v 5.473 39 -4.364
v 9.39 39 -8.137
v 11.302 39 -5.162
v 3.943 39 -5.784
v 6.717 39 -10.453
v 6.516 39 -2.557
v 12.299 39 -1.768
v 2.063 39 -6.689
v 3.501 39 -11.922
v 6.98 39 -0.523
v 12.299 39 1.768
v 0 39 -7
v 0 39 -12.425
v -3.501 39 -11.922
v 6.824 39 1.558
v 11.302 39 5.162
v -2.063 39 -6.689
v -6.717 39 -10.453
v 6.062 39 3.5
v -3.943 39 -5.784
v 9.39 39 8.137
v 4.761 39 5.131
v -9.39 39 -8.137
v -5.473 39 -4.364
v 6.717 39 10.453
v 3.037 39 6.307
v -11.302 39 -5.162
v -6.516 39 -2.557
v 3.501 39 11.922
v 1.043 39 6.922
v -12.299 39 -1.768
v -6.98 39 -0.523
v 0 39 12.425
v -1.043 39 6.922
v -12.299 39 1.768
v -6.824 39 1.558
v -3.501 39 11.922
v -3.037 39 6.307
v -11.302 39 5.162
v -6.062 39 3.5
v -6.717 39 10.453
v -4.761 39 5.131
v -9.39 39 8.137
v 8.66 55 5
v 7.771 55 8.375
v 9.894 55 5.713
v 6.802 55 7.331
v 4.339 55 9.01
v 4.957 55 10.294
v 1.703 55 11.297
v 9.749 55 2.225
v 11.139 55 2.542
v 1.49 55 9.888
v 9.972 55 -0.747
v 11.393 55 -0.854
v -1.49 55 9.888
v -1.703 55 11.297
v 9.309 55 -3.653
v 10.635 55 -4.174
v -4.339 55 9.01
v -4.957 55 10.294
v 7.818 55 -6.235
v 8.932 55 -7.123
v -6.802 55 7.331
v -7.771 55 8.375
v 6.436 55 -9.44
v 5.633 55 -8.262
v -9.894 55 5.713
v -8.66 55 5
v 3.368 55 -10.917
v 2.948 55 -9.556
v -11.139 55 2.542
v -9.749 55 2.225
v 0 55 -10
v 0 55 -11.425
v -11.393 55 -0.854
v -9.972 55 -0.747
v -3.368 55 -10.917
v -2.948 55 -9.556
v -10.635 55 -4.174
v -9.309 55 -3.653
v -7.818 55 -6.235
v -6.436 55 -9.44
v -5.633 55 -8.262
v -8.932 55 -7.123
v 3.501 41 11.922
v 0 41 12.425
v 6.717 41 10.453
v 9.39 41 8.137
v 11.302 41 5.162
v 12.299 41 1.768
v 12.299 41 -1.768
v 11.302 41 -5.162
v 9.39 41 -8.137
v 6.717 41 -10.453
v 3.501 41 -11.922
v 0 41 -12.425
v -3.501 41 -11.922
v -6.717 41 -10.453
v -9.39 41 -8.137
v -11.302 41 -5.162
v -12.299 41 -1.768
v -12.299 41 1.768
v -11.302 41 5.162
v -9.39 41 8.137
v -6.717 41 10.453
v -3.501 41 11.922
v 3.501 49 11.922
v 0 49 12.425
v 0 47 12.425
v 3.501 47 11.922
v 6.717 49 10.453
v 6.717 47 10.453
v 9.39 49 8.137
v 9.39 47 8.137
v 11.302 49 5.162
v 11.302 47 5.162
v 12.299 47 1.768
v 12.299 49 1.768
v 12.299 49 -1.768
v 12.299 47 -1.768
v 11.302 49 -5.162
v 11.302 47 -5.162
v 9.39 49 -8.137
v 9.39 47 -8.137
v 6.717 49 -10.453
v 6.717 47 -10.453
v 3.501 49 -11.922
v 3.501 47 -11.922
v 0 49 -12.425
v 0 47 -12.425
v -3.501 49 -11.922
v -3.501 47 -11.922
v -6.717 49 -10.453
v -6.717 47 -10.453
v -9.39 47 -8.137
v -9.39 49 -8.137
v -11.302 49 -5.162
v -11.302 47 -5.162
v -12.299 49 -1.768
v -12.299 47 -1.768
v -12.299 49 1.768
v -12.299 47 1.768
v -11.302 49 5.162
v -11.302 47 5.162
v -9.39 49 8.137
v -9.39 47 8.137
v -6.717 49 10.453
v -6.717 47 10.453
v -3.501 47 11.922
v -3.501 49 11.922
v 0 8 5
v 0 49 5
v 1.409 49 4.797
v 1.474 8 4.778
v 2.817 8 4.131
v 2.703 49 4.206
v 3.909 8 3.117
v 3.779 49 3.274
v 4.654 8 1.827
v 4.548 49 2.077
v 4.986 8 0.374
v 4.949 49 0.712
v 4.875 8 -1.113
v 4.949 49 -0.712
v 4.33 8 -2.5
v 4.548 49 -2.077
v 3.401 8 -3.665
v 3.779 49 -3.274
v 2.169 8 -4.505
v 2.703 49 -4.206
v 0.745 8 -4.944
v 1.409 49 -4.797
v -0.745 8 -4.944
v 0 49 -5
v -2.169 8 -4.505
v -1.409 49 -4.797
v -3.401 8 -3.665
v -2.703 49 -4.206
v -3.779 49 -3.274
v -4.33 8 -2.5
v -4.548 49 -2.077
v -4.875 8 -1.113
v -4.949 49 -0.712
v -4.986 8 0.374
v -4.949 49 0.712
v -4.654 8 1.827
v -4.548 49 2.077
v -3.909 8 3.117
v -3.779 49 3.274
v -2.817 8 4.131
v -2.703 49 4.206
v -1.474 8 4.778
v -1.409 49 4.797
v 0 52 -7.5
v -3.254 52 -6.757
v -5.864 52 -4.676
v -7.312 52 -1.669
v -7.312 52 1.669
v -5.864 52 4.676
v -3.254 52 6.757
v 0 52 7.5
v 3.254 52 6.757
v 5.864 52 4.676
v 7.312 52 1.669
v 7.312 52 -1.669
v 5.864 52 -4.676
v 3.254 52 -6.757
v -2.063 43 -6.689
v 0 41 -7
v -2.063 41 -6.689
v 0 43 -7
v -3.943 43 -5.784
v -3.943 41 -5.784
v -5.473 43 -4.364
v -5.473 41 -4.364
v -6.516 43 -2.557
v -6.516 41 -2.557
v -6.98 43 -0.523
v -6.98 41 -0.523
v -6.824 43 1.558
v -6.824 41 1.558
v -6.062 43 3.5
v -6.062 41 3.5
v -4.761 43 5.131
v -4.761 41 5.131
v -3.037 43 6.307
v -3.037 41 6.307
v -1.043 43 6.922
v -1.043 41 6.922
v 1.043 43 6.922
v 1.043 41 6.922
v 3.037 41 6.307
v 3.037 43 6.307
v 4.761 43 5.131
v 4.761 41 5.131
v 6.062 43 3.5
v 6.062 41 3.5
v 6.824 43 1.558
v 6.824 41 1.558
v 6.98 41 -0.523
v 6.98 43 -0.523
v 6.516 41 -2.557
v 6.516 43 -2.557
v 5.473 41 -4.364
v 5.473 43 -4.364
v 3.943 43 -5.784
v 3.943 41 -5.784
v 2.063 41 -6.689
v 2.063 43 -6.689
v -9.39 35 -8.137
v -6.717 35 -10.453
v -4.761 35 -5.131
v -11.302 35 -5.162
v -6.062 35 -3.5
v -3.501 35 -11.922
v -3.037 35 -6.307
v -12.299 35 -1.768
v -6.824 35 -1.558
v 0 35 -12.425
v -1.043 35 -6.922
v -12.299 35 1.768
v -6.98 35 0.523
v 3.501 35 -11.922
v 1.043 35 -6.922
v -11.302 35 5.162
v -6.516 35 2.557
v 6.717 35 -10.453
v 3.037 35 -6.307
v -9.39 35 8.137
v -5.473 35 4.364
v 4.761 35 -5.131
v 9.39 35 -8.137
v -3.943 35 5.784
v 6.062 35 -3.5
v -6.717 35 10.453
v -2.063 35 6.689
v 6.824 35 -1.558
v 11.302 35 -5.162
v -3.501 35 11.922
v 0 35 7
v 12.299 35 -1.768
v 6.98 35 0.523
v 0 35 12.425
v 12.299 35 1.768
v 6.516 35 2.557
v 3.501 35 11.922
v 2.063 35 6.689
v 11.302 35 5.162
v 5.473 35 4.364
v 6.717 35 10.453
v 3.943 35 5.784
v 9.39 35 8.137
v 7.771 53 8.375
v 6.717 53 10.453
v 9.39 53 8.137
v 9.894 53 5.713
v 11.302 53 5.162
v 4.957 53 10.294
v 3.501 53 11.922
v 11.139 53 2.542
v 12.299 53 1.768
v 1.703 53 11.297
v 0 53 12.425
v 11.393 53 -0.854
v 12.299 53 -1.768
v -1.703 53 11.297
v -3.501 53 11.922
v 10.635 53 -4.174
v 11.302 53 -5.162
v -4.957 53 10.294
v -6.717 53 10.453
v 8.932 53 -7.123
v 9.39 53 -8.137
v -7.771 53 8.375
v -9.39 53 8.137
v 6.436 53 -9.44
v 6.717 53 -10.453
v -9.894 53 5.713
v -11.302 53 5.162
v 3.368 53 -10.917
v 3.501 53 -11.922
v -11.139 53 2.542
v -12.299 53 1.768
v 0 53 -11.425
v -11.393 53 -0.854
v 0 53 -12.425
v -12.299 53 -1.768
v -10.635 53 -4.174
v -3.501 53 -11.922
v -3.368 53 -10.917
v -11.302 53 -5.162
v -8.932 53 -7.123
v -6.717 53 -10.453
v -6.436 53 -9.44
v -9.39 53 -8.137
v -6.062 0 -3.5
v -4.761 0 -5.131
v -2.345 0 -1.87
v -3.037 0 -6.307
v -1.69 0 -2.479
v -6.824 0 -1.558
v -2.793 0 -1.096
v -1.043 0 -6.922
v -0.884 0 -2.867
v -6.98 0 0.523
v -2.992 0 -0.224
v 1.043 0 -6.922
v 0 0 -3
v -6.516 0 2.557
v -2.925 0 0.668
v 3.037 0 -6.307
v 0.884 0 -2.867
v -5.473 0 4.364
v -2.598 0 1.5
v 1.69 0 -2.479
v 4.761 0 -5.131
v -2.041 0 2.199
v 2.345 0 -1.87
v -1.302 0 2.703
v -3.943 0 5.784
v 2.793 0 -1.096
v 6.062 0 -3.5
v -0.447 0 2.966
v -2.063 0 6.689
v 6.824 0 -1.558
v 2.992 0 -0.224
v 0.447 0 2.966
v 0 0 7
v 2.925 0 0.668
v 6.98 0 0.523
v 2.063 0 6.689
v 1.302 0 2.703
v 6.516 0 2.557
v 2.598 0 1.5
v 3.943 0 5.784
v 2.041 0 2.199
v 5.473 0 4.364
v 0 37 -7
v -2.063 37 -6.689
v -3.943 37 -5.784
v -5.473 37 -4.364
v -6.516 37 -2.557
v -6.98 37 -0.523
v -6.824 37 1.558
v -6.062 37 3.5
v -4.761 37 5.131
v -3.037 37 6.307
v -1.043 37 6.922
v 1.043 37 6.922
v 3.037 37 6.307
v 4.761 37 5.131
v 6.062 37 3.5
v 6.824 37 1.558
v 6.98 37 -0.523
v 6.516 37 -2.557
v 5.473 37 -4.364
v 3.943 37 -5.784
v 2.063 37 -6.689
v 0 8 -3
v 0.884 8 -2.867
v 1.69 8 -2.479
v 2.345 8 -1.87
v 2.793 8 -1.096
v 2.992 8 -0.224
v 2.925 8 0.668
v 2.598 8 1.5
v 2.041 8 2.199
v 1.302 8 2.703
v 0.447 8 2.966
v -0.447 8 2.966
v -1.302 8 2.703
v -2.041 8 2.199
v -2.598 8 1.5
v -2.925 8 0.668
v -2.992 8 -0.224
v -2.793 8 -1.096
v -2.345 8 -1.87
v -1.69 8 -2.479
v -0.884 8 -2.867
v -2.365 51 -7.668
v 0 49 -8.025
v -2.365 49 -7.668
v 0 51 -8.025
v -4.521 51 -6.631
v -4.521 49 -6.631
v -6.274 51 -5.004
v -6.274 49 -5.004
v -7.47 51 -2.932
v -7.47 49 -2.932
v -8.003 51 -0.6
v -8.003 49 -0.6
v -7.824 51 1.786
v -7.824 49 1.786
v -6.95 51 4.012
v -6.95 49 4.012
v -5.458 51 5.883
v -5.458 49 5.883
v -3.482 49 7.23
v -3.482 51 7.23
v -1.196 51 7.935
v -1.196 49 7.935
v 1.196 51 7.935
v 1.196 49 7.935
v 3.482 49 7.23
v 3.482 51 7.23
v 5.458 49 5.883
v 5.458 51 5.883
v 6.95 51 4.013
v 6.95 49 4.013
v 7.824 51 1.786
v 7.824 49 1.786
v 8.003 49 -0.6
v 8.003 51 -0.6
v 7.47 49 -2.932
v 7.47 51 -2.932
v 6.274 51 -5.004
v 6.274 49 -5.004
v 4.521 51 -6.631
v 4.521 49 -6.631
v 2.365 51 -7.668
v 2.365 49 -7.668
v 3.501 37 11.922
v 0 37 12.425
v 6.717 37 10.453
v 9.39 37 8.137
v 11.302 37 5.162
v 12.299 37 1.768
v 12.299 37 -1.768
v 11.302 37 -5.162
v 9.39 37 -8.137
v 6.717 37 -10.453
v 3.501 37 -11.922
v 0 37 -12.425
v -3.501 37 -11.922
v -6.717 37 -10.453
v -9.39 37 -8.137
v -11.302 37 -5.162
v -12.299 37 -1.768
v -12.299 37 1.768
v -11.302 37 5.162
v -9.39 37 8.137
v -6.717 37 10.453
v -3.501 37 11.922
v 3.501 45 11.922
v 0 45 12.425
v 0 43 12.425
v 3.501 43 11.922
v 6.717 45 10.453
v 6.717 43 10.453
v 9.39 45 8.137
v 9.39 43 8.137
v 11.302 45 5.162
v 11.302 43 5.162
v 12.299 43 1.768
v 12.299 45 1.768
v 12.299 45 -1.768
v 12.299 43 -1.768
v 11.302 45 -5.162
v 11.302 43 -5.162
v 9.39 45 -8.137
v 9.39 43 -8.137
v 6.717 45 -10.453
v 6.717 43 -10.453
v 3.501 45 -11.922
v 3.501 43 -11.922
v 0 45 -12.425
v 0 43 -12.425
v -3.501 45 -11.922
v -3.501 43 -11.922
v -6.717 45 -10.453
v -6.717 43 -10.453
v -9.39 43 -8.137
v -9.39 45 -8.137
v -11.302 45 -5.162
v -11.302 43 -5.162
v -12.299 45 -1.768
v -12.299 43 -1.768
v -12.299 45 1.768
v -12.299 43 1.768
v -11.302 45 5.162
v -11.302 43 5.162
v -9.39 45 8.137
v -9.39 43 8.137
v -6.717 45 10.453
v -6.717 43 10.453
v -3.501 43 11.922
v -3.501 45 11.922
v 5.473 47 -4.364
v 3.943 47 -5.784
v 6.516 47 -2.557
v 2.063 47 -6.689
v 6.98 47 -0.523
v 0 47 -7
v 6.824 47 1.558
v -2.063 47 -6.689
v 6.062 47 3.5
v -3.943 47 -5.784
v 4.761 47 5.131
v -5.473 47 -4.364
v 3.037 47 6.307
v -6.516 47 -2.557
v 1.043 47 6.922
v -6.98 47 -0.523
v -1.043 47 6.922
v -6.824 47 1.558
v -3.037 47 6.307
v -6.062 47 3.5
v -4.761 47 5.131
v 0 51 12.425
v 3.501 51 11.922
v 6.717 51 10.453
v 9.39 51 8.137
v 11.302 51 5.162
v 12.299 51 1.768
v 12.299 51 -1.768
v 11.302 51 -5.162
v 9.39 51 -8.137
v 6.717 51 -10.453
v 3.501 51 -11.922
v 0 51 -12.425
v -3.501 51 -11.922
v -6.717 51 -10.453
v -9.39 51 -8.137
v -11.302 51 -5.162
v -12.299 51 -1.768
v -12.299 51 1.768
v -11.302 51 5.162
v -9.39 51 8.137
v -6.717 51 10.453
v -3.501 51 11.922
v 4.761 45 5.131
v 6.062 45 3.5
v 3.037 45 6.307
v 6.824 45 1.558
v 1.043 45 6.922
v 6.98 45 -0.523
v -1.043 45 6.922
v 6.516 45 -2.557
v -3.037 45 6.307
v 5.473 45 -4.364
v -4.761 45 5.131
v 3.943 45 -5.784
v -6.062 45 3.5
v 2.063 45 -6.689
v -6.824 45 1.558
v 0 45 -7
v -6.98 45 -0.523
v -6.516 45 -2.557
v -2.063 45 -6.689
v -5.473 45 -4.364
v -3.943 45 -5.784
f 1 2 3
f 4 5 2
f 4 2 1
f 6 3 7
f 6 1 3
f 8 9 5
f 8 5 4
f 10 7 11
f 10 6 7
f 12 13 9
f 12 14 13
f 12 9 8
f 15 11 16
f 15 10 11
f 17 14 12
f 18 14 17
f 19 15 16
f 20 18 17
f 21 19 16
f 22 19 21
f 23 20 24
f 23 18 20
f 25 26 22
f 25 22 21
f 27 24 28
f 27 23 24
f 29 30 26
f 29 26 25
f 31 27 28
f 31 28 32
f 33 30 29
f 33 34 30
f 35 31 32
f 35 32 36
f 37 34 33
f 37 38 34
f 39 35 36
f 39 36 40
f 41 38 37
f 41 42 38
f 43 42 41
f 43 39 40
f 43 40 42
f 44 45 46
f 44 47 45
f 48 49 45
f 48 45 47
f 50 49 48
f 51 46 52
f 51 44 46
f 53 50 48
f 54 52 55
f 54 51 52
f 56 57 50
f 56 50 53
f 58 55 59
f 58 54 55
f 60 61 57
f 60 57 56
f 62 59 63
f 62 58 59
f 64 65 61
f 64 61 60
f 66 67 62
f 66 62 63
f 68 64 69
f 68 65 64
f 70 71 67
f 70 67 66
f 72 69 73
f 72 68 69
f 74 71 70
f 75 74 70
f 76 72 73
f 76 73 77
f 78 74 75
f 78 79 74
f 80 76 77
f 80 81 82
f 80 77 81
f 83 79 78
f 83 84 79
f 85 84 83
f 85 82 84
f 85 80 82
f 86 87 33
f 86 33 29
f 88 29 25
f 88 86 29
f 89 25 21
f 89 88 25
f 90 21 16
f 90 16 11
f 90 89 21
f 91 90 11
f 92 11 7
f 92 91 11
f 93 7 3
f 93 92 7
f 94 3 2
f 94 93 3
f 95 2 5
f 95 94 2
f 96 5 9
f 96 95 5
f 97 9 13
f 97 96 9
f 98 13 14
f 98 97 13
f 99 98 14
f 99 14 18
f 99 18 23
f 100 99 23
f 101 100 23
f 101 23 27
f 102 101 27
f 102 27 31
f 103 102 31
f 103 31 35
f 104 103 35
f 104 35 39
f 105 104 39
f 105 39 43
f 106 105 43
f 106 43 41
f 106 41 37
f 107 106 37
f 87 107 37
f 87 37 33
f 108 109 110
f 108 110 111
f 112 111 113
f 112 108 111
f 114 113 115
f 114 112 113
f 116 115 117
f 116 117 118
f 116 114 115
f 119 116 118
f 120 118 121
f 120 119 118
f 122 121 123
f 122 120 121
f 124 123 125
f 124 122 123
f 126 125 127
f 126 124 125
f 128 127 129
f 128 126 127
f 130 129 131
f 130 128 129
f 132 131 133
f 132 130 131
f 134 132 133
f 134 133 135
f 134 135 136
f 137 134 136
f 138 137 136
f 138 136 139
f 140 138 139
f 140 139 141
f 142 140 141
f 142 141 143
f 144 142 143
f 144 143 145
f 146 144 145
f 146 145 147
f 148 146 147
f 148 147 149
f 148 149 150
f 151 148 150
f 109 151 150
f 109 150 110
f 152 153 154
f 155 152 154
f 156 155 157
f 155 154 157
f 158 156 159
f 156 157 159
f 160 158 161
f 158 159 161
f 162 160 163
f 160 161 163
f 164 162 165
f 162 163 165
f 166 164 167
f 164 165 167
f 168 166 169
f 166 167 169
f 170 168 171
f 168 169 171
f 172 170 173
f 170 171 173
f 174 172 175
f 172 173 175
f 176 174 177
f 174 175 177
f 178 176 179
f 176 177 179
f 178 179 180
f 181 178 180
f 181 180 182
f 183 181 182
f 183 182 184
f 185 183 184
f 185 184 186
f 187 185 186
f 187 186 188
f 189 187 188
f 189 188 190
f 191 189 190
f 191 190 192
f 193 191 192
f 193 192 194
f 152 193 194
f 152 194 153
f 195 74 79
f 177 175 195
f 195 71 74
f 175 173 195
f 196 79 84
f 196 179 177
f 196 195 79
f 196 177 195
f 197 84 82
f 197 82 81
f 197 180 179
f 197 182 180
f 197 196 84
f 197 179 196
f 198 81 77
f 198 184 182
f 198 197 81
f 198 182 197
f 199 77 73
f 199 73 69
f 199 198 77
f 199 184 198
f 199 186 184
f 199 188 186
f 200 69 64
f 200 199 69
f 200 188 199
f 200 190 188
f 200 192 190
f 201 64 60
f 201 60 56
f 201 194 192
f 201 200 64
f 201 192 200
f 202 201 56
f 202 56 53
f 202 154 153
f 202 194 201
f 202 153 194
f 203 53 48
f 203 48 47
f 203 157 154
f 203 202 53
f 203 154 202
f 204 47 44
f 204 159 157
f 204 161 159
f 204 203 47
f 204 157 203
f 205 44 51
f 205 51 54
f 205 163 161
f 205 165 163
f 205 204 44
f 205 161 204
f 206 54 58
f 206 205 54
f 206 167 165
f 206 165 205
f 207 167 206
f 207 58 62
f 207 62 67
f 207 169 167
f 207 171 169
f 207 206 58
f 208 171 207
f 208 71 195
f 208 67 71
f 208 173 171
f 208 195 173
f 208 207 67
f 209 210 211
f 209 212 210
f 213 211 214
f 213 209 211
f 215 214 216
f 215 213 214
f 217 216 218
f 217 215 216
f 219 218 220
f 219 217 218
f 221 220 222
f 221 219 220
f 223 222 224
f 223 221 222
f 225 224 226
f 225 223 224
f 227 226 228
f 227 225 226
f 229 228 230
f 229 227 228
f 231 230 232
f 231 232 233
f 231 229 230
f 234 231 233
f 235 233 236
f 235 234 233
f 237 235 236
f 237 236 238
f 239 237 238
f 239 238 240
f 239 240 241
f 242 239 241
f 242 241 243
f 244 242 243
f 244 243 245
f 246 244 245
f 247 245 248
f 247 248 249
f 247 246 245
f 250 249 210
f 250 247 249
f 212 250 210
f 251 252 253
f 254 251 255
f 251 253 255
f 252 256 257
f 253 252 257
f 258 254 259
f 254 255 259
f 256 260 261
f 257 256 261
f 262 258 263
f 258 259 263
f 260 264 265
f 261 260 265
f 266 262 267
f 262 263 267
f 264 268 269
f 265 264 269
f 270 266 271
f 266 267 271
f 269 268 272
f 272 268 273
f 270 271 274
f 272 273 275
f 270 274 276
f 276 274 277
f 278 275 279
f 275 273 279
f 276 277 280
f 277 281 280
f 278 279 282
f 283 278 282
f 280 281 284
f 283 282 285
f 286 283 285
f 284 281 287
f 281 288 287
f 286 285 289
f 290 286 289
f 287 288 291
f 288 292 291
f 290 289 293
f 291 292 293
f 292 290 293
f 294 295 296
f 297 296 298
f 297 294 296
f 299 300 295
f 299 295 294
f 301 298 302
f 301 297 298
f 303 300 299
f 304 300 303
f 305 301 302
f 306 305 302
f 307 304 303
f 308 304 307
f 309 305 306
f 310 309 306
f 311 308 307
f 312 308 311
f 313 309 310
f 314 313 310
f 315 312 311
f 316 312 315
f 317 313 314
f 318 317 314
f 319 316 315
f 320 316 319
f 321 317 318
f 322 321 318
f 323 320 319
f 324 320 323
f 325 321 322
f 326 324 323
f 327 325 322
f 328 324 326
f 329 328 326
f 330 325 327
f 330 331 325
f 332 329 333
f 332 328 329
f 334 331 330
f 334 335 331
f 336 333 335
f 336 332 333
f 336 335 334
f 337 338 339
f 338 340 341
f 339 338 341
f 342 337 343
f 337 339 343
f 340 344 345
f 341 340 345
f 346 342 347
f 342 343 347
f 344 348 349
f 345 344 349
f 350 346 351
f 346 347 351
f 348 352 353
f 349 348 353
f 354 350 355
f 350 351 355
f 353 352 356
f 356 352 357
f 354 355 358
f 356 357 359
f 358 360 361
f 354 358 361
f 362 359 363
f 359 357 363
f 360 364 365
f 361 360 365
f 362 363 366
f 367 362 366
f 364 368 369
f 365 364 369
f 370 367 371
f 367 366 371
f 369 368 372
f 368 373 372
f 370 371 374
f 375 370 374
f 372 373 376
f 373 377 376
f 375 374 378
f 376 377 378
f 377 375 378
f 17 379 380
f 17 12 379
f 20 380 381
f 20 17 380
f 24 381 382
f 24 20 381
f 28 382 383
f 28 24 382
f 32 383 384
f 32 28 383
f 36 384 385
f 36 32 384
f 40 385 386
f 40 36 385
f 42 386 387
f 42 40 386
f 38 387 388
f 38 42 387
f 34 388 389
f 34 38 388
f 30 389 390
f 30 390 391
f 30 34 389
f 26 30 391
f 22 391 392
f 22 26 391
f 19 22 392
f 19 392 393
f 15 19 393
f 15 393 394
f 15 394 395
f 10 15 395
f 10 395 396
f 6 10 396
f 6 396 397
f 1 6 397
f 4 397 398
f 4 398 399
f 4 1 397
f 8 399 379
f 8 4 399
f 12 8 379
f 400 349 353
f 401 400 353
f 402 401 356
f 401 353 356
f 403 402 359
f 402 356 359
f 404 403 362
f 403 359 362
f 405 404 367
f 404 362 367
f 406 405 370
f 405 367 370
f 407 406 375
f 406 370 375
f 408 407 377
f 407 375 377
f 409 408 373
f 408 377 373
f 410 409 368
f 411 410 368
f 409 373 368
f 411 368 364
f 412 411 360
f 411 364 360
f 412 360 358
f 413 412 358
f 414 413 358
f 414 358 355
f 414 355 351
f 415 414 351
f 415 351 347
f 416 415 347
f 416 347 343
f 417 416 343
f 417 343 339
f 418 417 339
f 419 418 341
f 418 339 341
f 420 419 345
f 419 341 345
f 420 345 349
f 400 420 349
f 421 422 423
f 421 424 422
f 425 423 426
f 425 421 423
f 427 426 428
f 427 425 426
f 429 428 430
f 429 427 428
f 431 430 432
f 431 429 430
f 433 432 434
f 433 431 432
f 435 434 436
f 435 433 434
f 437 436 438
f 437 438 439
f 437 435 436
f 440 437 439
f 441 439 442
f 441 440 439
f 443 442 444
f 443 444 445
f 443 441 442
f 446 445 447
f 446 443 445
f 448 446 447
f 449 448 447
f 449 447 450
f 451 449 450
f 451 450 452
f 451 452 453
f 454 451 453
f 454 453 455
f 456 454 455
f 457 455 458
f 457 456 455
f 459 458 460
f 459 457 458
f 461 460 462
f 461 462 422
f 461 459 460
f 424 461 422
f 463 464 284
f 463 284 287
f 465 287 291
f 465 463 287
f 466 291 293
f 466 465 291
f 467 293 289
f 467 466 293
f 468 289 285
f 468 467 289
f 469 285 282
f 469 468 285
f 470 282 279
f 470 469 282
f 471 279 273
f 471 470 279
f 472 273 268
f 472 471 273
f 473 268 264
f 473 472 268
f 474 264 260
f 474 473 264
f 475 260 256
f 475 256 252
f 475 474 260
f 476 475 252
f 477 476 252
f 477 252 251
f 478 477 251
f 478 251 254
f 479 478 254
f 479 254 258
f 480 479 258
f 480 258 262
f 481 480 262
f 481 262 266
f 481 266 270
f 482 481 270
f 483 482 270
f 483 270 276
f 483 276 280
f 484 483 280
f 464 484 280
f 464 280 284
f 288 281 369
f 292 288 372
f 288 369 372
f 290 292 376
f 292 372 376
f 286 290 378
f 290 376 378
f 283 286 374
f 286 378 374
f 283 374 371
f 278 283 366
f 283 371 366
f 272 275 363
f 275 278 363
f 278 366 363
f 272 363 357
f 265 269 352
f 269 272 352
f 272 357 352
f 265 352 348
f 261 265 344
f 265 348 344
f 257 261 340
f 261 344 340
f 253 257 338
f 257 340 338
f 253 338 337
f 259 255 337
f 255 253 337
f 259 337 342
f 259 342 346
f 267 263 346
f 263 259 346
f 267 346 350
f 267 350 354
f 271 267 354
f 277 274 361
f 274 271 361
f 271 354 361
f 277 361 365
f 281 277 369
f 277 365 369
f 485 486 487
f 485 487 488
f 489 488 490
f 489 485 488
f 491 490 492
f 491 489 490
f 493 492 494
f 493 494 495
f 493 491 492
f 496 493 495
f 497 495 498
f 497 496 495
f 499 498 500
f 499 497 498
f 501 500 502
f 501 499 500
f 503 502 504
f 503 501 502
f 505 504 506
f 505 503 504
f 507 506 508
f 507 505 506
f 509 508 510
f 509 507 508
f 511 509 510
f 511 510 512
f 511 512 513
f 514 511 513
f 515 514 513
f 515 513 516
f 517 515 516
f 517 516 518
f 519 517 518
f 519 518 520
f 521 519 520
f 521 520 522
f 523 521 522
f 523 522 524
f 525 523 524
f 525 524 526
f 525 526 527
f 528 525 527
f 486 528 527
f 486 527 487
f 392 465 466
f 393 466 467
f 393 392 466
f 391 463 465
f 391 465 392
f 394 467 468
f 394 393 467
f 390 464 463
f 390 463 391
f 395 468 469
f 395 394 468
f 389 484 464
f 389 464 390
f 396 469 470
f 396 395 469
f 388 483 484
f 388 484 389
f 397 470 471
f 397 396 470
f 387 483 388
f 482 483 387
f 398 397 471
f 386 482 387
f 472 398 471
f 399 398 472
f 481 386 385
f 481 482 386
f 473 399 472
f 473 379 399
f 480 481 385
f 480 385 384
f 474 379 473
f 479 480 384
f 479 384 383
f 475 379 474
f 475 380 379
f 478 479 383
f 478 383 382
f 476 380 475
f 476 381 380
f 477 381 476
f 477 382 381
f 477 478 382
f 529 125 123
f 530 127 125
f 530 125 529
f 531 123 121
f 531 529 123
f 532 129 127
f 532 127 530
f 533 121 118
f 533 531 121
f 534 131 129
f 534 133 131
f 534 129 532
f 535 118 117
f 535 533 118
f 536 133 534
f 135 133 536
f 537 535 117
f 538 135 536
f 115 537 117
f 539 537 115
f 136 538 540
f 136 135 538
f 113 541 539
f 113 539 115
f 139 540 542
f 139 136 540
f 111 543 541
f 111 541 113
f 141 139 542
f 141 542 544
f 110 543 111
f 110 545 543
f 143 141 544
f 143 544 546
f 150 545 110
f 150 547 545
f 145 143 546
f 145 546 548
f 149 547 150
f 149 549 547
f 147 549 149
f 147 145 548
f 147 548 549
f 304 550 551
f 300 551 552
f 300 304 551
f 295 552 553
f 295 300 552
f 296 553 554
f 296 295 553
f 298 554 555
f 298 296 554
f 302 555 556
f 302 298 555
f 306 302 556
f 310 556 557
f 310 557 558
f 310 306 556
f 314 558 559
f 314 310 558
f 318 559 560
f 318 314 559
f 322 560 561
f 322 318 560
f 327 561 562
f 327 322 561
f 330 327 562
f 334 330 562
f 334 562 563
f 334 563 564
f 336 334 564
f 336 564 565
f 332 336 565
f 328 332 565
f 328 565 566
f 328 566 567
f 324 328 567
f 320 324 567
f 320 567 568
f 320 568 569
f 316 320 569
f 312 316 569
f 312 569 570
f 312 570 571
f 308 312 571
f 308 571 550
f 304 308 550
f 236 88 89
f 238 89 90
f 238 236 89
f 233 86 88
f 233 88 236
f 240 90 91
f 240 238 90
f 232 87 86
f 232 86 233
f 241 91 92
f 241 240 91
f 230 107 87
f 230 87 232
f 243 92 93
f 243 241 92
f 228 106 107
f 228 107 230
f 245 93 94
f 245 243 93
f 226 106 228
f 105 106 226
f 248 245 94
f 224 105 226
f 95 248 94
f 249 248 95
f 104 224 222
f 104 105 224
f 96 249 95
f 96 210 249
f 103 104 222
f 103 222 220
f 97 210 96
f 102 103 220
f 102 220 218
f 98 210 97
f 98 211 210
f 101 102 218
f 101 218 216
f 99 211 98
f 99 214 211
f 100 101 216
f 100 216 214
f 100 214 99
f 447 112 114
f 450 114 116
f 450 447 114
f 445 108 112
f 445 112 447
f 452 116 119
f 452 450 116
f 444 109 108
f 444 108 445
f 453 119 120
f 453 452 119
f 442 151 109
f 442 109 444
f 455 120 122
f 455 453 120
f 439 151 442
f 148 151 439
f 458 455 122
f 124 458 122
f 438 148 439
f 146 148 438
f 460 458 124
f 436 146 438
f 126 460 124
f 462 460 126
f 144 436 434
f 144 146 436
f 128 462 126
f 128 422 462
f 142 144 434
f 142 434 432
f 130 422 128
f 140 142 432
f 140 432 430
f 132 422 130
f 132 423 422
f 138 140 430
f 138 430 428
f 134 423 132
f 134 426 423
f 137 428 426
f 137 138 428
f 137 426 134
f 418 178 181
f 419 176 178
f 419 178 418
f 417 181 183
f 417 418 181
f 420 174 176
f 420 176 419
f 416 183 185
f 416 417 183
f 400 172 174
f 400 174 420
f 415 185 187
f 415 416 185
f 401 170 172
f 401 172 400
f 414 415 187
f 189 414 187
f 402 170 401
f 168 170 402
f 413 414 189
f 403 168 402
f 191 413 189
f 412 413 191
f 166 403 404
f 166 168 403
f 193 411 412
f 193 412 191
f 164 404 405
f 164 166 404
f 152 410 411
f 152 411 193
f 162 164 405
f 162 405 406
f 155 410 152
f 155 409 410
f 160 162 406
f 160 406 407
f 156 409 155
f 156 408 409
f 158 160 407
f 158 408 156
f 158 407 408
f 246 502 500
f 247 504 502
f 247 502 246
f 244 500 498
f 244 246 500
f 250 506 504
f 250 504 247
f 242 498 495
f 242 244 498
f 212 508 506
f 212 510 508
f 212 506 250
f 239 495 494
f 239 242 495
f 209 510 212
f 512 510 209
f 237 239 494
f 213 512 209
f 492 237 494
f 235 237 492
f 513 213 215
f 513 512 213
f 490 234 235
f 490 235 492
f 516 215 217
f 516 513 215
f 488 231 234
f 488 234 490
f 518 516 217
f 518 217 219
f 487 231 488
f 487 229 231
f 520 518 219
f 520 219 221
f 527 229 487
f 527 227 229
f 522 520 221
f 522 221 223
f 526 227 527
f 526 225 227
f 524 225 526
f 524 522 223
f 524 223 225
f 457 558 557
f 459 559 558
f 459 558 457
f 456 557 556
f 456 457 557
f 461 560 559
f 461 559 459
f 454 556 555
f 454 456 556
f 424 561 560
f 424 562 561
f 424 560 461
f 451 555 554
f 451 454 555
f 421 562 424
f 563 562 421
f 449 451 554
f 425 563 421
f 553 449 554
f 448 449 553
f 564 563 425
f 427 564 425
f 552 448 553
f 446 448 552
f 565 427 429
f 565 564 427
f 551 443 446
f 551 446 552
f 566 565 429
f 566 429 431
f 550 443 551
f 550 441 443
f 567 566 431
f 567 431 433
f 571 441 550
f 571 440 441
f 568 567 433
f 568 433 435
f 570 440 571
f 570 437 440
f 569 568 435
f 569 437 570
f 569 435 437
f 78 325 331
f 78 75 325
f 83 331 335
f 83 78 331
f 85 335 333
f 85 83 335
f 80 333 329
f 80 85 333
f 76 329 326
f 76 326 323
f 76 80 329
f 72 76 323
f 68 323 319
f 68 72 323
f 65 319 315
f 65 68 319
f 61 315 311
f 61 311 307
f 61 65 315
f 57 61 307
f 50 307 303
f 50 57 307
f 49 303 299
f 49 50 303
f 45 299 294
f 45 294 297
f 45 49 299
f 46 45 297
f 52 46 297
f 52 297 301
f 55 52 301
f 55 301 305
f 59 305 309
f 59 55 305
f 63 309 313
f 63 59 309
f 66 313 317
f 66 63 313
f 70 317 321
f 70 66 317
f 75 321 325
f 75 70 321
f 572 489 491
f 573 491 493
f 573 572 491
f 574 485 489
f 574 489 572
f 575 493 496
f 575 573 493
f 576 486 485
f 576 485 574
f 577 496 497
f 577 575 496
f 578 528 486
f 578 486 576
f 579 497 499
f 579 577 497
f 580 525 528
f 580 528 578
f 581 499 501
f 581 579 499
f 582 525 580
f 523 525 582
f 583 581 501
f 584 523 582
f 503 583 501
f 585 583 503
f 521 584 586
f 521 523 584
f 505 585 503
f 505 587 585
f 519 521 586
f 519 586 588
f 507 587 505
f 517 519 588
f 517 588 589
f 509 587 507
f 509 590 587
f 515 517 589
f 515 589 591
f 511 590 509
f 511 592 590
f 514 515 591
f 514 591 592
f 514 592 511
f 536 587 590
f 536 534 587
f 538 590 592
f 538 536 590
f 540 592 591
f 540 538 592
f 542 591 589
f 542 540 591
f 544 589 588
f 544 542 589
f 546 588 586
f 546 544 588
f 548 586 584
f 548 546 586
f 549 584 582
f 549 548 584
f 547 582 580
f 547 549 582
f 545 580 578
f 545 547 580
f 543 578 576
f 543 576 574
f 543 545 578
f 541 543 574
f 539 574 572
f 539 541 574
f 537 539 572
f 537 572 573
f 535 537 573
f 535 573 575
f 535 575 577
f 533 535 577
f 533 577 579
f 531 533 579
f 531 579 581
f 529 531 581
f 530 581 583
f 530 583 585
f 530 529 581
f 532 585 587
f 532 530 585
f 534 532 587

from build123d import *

# Parameters (mm, degrees)
CROQUIS2_R              = 7
SALIENTE_EXTRUIR1_DEPTH = 55
CROQUIS3_R              = 12.425
SALIENTE_EXTRUIR2_DEPTH = 20
CROQUIS4_R              = 5
CORTAR_EXTRUIR1_DEPTH   = 47
CROQUIS7_R              = 3
CORTAR_EXTRUIR2_DEPTH   = 8


with BuildPart() as part:
    # Croquis2 → Saliente-Extruir1 (new body)
    with BuildSketch(Plane(origin=(0, 0, 0), x_dir=(1, 0, 0), z_dir=(0, 1, 0))):
        with Locations(Location((0, 0, 0), (0, 0, 270))):
            Circle(CROQUIS2_R)
    extrude(amount=SALIENTE_EXTRUIR1_DEPTH)

    # Croquis3 → Saliente-Extruir2 (add)
    with BuildSketch(Plane(origin=(0, 55, 0), x_dir=(1, 0, 0), z_dir=(0, 1, 0))):
        with Locations(Location((0, 0, 0), (0, 0, 270))):
            Circle(CROQUIS3_R)
    extrude(amount=-SALIENTE_EXTRUIR2_DEPTH)

    # Croquis4 → Cortar-Extruir1 (cut)
    with BuildSketch(Plane(origin=(0, 55, 0), x_dir=(1, 0, 0), z_dir=(0, 1, 0))):
        with Locations(Location((0, 0, 0), (0, 0, 270))):
            Circle(CROQUIS4_R)
    extrude(amount=-CORTAR_EXTRUIR1_DEPTH, mode=Mode.SUBTRACT)

    # Croquis7 → Cortar-Extruir2 (cut)
    with BuildSketch(Plane.XZ):
        with Locations(Location((0, 0, 0), (0, 0, 270))):
            Circle(CROQUIS7_R)
    extrude(amount=-CORTAR_EXTRUIR2_DEPTH, mode=Mode.SUBTRACT)

    # Croquis5 → Cortar-Revolución1 (revolve, cut)
    with BuildSketch(Plane.XY, mode=Mode.PRIVATE) as cortar_revoluci_n1_sk:
        Polygon((-5, 49), (0, 49), (0, 63.271347918), (-20.39383665, 63.271347918), (-20.39383665, 37), (-12.425, 37), (-7, 37), (-7, 39), (-12.425, 39), (-12.425, 41), (-7, 41), (-7, 43), (-12.425, 43), (-12.425, 45), (-7, 45), (-7, 47), (-12.425, 47), (-12.425, 49), (-8.025, 49), (-8.025, 51), (-12.425, 51), (-12.425, 53), (-11.425, 53), (-11.425, 55), (-10, 55), align=None)
    revolve(cortar_revoluci_n1_sk.sketch.rotate(Axis((0, 0, 0), (0, 1, 0)), 270), axis=Axis((0, 0, 0), (0, 1, 0)), mode=Mode.SUBTRACT)


solid = part.part
